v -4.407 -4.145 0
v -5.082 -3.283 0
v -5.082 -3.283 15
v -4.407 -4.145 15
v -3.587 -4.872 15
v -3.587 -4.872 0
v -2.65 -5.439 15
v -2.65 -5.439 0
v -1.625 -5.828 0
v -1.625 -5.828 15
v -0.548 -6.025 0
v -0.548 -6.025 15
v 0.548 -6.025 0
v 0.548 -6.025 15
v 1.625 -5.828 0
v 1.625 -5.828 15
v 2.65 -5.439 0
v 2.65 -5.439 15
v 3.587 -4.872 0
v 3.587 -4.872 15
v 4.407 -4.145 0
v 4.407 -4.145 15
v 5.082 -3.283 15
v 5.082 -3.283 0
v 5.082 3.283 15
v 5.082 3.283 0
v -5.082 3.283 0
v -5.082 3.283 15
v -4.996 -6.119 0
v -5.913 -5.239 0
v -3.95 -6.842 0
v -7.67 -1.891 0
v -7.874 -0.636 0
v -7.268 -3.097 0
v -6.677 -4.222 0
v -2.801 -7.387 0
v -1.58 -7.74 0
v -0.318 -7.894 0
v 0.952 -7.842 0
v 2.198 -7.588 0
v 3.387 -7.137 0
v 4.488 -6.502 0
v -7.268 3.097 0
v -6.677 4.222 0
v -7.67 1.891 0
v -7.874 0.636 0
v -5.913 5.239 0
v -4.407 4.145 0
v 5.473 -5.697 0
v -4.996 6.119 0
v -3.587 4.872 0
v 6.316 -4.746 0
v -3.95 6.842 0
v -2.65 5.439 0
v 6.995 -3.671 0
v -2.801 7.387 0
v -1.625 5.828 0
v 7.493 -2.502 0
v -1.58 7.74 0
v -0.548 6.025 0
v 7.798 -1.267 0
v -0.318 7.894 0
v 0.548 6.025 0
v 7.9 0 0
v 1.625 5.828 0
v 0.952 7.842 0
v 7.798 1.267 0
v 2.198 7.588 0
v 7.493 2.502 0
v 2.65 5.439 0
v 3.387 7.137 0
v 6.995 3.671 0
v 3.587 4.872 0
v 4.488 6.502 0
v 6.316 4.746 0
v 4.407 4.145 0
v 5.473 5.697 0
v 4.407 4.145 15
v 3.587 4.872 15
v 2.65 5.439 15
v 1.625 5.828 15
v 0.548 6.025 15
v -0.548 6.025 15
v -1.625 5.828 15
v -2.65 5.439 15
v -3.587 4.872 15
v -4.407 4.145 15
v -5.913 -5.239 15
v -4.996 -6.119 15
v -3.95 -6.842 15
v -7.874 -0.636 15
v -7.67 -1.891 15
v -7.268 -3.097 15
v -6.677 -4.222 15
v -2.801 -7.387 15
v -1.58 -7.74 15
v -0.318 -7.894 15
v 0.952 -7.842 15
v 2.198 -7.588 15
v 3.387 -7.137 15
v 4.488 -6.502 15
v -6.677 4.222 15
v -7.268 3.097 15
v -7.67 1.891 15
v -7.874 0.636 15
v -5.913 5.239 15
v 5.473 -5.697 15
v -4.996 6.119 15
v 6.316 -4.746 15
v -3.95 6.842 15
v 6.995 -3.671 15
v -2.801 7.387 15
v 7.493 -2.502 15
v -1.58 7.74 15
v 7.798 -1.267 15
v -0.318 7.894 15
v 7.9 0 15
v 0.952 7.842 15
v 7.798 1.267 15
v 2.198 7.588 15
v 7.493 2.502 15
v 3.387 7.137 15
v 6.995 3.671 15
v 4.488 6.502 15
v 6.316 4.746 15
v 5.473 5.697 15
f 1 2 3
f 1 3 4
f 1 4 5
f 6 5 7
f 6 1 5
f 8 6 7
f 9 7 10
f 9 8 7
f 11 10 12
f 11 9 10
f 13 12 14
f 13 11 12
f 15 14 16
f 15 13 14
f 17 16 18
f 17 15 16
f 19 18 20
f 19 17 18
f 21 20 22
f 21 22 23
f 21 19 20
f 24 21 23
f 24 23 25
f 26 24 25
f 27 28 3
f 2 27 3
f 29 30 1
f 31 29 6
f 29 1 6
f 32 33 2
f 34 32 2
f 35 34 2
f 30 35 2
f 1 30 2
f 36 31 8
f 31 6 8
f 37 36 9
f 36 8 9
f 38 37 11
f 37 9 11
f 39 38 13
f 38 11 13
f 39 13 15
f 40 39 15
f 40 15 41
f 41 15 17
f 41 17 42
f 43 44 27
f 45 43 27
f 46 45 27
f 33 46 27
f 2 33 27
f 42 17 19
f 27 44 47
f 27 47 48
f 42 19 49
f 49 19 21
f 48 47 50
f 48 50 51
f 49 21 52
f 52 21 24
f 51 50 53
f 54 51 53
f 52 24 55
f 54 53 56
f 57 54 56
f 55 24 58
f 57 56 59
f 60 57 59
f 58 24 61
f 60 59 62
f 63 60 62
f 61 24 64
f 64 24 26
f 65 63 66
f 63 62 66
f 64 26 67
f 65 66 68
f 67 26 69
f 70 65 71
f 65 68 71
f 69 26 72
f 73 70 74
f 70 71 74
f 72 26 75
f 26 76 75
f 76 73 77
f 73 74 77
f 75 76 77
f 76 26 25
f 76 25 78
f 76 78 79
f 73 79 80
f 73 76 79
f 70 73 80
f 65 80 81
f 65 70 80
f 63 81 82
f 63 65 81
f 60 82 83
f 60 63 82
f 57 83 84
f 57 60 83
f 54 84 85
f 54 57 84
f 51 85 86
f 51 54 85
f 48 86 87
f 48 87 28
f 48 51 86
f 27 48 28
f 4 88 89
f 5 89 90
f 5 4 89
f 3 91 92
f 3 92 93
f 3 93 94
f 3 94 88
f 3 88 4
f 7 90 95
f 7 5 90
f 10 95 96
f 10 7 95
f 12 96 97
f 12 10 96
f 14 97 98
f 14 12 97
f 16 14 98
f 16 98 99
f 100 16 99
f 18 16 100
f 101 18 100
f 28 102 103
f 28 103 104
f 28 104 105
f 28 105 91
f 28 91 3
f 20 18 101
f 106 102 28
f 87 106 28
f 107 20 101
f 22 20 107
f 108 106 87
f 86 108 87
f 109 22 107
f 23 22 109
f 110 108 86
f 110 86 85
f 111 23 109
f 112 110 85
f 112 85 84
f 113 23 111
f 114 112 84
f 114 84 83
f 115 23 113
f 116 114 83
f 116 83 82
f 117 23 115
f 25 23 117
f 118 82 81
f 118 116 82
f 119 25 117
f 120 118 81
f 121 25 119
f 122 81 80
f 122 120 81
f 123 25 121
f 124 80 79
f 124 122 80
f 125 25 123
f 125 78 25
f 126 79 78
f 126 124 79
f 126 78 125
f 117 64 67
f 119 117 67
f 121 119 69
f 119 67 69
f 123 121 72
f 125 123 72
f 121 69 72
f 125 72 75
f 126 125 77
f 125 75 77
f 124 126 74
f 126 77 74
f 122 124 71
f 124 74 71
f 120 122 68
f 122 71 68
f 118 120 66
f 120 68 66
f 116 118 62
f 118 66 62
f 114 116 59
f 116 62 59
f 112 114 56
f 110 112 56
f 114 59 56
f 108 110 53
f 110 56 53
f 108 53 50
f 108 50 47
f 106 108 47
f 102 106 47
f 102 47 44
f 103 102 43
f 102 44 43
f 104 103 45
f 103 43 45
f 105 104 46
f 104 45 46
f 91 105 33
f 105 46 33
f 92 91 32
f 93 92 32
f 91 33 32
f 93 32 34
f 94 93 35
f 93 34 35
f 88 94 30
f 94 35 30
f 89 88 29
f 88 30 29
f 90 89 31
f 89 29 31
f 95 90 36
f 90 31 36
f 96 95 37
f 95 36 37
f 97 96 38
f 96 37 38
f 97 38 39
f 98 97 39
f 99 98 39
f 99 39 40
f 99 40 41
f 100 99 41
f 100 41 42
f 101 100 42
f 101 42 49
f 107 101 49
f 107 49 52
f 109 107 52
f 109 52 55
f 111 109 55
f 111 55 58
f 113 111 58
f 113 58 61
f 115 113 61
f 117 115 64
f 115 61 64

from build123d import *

# Parameters (mm, degrees)
SKETCH_1_R      = 7.9
EXTRUDE_1_DEPTH = 15


with BuildPart() as part:
    # 草图1 → 凸台-拉伸1 (new body)
    with BuildSketch(Plane.XY):
        Circle(SKETCH_1_R)
        with BuildLine():
            Line((-5.082, 3.282647712), (-5.082, -3.282647712))
            ThreePointArc((-5.082, -3.282647712), (0, -6.05), (5.082, -3.282647712))
            Line((5.082, -3.282647712), (5.082, 3.282647712))
            ThreePointArc((5.082, 3.282647712), (0, 6.05), (-5.082, 3.282647712))
        make_face(mode=Mode.SUBTRACT)
    extrude(amount=EXTRUDE_1_DEPTH)


solid = part.part
